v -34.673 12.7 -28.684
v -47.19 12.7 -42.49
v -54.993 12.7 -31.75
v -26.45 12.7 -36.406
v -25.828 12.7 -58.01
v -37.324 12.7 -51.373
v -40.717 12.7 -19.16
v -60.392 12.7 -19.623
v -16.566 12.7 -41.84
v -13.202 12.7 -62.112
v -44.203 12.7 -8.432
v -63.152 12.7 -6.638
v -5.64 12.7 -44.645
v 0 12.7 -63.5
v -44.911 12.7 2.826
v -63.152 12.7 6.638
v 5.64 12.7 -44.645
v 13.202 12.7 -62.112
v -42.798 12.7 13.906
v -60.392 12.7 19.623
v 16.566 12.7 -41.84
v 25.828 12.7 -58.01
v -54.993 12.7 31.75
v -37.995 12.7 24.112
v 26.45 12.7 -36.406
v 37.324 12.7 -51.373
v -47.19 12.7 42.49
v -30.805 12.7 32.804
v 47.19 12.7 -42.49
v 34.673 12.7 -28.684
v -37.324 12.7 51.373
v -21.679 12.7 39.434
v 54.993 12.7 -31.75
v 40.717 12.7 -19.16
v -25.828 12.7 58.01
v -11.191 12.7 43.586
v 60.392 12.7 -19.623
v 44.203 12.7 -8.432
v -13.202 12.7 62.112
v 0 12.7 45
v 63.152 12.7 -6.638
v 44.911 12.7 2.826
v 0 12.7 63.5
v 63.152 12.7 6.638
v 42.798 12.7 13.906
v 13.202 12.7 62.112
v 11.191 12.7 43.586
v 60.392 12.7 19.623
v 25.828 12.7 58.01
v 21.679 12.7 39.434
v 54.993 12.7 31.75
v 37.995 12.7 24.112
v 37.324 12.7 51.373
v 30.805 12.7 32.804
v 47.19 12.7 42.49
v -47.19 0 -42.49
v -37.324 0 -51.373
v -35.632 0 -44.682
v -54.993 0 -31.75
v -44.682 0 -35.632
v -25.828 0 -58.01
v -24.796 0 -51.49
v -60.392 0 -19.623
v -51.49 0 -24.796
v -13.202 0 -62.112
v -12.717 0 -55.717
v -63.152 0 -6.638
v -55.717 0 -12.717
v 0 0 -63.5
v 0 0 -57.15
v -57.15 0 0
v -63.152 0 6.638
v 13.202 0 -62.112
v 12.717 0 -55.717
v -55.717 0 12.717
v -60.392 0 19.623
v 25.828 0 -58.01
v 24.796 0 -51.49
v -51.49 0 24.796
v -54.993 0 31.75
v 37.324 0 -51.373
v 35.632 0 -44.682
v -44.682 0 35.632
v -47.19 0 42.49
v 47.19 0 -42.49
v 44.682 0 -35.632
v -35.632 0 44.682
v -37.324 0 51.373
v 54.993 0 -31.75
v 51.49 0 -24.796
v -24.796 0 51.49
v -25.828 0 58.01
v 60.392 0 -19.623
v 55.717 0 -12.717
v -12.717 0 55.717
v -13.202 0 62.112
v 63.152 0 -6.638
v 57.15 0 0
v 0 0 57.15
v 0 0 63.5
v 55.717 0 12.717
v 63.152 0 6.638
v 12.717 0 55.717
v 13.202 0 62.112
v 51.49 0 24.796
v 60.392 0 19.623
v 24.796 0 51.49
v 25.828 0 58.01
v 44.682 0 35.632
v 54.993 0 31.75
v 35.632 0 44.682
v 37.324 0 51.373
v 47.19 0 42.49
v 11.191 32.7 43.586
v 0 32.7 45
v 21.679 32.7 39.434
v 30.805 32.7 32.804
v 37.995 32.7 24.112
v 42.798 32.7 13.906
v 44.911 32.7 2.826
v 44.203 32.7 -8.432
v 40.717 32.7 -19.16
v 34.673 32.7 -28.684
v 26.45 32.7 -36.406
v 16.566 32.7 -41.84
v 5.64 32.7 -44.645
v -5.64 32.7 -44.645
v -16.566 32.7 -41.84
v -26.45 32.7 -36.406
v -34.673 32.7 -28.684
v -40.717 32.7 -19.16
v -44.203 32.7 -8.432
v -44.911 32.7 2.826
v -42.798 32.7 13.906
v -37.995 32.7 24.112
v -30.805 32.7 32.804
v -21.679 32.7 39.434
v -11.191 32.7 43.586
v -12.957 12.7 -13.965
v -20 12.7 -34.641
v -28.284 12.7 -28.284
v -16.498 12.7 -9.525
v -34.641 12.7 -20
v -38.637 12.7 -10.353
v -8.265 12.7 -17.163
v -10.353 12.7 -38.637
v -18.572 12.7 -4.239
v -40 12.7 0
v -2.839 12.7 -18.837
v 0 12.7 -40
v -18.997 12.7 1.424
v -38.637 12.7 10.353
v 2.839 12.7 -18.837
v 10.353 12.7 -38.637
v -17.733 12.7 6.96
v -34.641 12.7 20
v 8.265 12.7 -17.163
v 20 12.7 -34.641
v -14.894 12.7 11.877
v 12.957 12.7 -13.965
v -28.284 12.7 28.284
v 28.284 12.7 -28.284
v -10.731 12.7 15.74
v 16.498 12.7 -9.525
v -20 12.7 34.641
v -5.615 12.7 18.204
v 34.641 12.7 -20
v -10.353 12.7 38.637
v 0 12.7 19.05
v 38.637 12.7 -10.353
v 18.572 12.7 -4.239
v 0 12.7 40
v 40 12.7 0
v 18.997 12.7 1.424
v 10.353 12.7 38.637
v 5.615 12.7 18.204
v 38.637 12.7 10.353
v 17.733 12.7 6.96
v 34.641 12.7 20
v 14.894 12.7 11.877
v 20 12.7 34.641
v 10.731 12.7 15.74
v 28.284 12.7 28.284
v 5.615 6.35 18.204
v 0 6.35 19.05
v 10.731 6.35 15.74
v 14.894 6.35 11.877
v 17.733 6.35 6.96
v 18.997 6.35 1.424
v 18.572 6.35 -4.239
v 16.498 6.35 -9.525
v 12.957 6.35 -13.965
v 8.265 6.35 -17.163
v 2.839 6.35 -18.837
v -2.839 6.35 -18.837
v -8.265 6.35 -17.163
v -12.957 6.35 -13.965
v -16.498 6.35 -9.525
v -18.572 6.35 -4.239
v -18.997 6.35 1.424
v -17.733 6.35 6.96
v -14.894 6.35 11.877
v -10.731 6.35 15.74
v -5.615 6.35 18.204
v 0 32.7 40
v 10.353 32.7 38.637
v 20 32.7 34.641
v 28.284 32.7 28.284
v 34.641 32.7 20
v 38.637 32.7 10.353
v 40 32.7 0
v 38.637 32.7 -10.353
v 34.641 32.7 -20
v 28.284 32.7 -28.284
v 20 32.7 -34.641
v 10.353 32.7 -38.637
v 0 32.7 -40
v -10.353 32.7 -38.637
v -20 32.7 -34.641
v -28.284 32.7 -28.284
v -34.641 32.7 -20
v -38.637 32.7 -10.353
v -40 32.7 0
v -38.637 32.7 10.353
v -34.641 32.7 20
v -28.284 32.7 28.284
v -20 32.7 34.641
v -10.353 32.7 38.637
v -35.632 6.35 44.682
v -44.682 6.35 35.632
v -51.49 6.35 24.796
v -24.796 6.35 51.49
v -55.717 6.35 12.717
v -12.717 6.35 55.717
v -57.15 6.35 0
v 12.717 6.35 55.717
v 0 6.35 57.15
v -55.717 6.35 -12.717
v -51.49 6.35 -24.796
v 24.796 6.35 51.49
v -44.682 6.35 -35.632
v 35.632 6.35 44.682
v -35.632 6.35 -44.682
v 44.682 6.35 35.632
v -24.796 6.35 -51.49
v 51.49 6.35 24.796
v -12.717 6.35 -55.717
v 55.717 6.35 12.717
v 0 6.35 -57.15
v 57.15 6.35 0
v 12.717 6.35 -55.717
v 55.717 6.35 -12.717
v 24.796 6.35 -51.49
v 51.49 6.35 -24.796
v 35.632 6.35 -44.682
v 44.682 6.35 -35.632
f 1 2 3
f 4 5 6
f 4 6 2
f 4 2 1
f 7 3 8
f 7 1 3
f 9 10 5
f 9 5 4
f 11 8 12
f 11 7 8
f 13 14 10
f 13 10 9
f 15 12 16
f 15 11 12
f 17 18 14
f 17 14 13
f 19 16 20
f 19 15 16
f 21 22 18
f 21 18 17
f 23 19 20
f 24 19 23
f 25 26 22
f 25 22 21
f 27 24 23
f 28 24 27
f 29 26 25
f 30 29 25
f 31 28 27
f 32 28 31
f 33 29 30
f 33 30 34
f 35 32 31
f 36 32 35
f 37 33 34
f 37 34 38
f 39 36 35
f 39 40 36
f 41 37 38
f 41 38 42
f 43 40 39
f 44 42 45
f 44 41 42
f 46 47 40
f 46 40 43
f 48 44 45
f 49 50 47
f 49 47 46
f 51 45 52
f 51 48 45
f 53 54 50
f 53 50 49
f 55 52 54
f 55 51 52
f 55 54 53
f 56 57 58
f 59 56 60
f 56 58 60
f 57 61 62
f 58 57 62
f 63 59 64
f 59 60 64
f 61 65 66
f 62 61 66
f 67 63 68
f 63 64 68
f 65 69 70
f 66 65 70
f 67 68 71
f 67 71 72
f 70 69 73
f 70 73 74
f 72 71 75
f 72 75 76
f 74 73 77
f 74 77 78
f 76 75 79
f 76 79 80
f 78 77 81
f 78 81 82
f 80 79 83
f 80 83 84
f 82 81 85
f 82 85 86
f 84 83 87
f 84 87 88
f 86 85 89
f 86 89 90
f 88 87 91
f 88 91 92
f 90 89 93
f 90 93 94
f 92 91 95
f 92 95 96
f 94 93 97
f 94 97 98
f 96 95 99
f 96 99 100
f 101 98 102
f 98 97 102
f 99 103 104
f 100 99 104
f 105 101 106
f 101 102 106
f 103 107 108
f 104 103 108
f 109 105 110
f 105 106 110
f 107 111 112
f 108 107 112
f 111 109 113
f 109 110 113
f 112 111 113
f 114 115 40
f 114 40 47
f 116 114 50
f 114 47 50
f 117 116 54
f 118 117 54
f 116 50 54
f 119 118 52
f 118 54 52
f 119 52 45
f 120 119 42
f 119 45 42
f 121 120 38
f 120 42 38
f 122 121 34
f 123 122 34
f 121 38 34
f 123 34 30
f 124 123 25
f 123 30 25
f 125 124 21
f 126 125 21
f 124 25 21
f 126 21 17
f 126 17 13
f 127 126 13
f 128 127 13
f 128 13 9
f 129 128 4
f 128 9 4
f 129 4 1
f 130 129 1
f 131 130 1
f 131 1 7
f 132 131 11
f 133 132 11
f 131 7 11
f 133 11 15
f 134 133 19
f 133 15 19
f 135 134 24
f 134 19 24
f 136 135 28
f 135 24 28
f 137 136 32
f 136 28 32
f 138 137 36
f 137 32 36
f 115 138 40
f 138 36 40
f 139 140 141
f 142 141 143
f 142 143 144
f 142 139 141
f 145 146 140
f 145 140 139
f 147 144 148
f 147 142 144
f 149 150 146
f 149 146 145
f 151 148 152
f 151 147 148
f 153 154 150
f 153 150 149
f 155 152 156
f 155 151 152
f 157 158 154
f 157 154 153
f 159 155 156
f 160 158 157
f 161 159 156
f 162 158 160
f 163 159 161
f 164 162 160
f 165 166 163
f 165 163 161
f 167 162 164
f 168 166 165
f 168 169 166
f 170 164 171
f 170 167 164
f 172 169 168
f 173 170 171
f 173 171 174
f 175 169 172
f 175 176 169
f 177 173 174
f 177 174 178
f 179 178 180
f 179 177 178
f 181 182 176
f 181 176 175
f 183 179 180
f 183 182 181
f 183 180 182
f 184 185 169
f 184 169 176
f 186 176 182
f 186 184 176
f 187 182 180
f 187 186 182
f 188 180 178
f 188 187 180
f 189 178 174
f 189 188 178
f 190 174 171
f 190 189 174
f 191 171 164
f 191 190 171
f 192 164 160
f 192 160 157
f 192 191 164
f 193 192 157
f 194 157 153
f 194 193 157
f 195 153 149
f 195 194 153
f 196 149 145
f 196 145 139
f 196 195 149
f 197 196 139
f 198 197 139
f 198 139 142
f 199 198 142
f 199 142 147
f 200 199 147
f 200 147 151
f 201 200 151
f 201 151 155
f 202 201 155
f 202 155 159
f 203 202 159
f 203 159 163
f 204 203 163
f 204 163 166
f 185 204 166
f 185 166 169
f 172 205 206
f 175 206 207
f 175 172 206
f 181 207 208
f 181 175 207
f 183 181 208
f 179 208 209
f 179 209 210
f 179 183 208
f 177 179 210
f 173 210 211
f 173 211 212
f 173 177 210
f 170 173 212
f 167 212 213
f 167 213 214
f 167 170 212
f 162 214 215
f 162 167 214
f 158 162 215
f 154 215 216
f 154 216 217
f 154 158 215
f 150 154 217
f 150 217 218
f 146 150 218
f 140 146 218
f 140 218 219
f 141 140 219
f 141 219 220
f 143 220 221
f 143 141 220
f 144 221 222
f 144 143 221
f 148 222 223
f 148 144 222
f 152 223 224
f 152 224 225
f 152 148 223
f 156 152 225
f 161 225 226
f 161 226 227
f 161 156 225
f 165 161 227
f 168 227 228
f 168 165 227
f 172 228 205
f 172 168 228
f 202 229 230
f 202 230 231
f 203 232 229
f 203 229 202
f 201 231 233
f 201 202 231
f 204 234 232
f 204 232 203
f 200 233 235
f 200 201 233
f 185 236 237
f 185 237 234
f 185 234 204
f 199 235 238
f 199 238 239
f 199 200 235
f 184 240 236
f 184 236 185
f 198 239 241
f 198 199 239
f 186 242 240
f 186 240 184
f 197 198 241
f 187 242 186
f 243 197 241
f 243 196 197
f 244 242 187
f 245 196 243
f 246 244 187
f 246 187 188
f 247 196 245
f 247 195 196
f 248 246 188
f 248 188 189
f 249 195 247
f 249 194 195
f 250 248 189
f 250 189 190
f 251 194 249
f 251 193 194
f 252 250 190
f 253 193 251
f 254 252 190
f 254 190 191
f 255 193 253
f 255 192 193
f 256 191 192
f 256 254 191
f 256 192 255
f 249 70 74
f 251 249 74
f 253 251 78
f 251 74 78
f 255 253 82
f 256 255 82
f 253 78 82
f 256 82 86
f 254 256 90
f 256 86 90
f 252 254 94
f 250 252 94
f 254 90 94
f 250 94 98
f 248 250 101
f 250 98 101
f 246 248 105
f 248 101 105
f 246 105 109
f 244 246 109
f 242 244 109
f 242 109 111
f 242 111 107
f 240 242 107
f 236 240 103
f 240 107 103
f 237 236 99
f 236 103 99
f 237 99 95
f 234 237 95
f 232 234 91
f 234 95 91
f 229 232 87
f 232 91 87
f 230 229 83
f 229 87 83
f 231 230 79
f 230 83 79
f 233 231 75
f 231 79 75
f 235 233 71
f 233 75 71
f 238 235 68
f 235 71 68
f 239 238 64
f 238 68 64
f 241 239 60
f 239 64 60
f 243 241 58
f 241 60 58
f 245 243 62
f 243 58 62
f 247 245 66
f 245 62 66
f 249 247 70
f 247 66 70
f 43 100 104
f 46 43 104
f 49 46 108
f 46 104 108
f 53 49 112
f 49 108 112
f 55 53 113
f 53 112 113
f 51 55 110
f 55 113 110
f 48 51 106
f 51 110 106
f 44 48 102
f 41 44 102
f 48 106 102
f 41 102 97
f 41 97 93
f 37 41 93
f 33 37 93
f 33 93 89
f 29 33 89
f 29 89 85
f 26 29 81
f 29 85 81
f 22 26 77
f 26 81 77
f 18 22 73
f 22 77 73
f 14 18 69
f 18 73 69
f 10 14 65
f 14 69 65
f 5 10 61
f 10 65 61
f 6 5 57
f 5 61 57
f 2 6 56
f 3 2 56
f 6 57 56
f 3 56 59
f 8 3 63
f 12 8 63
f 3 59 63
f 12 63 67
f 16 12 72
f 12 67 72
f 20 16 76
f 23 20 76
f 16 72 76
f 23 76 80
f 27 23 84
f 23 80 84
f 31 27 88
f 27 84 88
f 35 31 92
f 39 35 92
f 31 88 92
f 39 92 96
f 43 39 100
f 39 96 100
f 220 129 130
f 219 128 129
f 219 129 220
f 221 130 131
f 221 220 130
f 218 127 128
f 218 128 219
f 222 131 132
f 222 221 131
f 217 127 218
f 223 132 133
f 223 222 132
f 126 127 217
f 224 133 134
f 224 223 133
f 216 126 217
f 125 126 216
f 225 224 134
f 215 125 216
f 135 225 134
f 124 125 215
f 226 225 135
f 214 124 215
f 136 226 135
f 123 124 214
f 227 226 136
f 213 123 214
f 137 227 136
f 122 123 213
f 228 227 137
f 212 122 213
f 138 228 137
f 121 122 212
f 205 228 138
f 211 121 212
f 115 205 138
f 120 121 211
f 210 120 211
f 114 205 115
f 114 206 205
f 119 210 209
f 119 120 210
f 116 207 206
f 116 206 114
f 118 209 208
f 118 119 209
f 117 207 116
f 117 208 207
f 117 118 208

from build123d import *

# Parameters (mm, degrees)
SKETCH1_R           = 63.5
SKETCH1_R_2         = 19.05
BOSS_EXTRUDE1_DEPTH = 12.7
SKETCH2_R           = 57.15
CUT_EXTRUDE1_DEPTH  = 6.35
SKETCH3_R           = 45
SKETCH3_R_2         = 40
BOSS_EXTRUDE3_DEPTH = 20


with BuildPart() as part:
    # Sketch1 → Boss-Extrude1 (new body)
    with BuildSketch(Plane(origin=(0, 0, 0), x_dir=(1, 0, 0), z_dir=(0, 1, 0))):
        Circle(SKETCH1_R)
        Circle(SKETCH1_R_2, mode=Mode.SUBTRACT)
    extrude(amount=BOSS_EXTRUDE1_DEPTH)

    # Sketch2 → Cut-Extrude1 (cut)
    with BuildSketch(Plane.XZ):
        Circle(SKETCH2_R)
    extrude(amount=-CUT_EXTRUDE1_DEPTH, mode=Mode.SUBTRACT)

    # Sketch3 → Boss-Extrude3 (add)
    with BuildSketch(Plane(origin=(0, 12.7, 0), x_dir=(1, 0, 0), z_dir=(0, 1, 0))):
        Circle(SKETCH3_R)
        Circle(SKETCH3_R_2, mode=Mode.SUBTRACT)
    extrude(amount=BOSS_EXTRUDE3_DEPTH)


solid = part.part
